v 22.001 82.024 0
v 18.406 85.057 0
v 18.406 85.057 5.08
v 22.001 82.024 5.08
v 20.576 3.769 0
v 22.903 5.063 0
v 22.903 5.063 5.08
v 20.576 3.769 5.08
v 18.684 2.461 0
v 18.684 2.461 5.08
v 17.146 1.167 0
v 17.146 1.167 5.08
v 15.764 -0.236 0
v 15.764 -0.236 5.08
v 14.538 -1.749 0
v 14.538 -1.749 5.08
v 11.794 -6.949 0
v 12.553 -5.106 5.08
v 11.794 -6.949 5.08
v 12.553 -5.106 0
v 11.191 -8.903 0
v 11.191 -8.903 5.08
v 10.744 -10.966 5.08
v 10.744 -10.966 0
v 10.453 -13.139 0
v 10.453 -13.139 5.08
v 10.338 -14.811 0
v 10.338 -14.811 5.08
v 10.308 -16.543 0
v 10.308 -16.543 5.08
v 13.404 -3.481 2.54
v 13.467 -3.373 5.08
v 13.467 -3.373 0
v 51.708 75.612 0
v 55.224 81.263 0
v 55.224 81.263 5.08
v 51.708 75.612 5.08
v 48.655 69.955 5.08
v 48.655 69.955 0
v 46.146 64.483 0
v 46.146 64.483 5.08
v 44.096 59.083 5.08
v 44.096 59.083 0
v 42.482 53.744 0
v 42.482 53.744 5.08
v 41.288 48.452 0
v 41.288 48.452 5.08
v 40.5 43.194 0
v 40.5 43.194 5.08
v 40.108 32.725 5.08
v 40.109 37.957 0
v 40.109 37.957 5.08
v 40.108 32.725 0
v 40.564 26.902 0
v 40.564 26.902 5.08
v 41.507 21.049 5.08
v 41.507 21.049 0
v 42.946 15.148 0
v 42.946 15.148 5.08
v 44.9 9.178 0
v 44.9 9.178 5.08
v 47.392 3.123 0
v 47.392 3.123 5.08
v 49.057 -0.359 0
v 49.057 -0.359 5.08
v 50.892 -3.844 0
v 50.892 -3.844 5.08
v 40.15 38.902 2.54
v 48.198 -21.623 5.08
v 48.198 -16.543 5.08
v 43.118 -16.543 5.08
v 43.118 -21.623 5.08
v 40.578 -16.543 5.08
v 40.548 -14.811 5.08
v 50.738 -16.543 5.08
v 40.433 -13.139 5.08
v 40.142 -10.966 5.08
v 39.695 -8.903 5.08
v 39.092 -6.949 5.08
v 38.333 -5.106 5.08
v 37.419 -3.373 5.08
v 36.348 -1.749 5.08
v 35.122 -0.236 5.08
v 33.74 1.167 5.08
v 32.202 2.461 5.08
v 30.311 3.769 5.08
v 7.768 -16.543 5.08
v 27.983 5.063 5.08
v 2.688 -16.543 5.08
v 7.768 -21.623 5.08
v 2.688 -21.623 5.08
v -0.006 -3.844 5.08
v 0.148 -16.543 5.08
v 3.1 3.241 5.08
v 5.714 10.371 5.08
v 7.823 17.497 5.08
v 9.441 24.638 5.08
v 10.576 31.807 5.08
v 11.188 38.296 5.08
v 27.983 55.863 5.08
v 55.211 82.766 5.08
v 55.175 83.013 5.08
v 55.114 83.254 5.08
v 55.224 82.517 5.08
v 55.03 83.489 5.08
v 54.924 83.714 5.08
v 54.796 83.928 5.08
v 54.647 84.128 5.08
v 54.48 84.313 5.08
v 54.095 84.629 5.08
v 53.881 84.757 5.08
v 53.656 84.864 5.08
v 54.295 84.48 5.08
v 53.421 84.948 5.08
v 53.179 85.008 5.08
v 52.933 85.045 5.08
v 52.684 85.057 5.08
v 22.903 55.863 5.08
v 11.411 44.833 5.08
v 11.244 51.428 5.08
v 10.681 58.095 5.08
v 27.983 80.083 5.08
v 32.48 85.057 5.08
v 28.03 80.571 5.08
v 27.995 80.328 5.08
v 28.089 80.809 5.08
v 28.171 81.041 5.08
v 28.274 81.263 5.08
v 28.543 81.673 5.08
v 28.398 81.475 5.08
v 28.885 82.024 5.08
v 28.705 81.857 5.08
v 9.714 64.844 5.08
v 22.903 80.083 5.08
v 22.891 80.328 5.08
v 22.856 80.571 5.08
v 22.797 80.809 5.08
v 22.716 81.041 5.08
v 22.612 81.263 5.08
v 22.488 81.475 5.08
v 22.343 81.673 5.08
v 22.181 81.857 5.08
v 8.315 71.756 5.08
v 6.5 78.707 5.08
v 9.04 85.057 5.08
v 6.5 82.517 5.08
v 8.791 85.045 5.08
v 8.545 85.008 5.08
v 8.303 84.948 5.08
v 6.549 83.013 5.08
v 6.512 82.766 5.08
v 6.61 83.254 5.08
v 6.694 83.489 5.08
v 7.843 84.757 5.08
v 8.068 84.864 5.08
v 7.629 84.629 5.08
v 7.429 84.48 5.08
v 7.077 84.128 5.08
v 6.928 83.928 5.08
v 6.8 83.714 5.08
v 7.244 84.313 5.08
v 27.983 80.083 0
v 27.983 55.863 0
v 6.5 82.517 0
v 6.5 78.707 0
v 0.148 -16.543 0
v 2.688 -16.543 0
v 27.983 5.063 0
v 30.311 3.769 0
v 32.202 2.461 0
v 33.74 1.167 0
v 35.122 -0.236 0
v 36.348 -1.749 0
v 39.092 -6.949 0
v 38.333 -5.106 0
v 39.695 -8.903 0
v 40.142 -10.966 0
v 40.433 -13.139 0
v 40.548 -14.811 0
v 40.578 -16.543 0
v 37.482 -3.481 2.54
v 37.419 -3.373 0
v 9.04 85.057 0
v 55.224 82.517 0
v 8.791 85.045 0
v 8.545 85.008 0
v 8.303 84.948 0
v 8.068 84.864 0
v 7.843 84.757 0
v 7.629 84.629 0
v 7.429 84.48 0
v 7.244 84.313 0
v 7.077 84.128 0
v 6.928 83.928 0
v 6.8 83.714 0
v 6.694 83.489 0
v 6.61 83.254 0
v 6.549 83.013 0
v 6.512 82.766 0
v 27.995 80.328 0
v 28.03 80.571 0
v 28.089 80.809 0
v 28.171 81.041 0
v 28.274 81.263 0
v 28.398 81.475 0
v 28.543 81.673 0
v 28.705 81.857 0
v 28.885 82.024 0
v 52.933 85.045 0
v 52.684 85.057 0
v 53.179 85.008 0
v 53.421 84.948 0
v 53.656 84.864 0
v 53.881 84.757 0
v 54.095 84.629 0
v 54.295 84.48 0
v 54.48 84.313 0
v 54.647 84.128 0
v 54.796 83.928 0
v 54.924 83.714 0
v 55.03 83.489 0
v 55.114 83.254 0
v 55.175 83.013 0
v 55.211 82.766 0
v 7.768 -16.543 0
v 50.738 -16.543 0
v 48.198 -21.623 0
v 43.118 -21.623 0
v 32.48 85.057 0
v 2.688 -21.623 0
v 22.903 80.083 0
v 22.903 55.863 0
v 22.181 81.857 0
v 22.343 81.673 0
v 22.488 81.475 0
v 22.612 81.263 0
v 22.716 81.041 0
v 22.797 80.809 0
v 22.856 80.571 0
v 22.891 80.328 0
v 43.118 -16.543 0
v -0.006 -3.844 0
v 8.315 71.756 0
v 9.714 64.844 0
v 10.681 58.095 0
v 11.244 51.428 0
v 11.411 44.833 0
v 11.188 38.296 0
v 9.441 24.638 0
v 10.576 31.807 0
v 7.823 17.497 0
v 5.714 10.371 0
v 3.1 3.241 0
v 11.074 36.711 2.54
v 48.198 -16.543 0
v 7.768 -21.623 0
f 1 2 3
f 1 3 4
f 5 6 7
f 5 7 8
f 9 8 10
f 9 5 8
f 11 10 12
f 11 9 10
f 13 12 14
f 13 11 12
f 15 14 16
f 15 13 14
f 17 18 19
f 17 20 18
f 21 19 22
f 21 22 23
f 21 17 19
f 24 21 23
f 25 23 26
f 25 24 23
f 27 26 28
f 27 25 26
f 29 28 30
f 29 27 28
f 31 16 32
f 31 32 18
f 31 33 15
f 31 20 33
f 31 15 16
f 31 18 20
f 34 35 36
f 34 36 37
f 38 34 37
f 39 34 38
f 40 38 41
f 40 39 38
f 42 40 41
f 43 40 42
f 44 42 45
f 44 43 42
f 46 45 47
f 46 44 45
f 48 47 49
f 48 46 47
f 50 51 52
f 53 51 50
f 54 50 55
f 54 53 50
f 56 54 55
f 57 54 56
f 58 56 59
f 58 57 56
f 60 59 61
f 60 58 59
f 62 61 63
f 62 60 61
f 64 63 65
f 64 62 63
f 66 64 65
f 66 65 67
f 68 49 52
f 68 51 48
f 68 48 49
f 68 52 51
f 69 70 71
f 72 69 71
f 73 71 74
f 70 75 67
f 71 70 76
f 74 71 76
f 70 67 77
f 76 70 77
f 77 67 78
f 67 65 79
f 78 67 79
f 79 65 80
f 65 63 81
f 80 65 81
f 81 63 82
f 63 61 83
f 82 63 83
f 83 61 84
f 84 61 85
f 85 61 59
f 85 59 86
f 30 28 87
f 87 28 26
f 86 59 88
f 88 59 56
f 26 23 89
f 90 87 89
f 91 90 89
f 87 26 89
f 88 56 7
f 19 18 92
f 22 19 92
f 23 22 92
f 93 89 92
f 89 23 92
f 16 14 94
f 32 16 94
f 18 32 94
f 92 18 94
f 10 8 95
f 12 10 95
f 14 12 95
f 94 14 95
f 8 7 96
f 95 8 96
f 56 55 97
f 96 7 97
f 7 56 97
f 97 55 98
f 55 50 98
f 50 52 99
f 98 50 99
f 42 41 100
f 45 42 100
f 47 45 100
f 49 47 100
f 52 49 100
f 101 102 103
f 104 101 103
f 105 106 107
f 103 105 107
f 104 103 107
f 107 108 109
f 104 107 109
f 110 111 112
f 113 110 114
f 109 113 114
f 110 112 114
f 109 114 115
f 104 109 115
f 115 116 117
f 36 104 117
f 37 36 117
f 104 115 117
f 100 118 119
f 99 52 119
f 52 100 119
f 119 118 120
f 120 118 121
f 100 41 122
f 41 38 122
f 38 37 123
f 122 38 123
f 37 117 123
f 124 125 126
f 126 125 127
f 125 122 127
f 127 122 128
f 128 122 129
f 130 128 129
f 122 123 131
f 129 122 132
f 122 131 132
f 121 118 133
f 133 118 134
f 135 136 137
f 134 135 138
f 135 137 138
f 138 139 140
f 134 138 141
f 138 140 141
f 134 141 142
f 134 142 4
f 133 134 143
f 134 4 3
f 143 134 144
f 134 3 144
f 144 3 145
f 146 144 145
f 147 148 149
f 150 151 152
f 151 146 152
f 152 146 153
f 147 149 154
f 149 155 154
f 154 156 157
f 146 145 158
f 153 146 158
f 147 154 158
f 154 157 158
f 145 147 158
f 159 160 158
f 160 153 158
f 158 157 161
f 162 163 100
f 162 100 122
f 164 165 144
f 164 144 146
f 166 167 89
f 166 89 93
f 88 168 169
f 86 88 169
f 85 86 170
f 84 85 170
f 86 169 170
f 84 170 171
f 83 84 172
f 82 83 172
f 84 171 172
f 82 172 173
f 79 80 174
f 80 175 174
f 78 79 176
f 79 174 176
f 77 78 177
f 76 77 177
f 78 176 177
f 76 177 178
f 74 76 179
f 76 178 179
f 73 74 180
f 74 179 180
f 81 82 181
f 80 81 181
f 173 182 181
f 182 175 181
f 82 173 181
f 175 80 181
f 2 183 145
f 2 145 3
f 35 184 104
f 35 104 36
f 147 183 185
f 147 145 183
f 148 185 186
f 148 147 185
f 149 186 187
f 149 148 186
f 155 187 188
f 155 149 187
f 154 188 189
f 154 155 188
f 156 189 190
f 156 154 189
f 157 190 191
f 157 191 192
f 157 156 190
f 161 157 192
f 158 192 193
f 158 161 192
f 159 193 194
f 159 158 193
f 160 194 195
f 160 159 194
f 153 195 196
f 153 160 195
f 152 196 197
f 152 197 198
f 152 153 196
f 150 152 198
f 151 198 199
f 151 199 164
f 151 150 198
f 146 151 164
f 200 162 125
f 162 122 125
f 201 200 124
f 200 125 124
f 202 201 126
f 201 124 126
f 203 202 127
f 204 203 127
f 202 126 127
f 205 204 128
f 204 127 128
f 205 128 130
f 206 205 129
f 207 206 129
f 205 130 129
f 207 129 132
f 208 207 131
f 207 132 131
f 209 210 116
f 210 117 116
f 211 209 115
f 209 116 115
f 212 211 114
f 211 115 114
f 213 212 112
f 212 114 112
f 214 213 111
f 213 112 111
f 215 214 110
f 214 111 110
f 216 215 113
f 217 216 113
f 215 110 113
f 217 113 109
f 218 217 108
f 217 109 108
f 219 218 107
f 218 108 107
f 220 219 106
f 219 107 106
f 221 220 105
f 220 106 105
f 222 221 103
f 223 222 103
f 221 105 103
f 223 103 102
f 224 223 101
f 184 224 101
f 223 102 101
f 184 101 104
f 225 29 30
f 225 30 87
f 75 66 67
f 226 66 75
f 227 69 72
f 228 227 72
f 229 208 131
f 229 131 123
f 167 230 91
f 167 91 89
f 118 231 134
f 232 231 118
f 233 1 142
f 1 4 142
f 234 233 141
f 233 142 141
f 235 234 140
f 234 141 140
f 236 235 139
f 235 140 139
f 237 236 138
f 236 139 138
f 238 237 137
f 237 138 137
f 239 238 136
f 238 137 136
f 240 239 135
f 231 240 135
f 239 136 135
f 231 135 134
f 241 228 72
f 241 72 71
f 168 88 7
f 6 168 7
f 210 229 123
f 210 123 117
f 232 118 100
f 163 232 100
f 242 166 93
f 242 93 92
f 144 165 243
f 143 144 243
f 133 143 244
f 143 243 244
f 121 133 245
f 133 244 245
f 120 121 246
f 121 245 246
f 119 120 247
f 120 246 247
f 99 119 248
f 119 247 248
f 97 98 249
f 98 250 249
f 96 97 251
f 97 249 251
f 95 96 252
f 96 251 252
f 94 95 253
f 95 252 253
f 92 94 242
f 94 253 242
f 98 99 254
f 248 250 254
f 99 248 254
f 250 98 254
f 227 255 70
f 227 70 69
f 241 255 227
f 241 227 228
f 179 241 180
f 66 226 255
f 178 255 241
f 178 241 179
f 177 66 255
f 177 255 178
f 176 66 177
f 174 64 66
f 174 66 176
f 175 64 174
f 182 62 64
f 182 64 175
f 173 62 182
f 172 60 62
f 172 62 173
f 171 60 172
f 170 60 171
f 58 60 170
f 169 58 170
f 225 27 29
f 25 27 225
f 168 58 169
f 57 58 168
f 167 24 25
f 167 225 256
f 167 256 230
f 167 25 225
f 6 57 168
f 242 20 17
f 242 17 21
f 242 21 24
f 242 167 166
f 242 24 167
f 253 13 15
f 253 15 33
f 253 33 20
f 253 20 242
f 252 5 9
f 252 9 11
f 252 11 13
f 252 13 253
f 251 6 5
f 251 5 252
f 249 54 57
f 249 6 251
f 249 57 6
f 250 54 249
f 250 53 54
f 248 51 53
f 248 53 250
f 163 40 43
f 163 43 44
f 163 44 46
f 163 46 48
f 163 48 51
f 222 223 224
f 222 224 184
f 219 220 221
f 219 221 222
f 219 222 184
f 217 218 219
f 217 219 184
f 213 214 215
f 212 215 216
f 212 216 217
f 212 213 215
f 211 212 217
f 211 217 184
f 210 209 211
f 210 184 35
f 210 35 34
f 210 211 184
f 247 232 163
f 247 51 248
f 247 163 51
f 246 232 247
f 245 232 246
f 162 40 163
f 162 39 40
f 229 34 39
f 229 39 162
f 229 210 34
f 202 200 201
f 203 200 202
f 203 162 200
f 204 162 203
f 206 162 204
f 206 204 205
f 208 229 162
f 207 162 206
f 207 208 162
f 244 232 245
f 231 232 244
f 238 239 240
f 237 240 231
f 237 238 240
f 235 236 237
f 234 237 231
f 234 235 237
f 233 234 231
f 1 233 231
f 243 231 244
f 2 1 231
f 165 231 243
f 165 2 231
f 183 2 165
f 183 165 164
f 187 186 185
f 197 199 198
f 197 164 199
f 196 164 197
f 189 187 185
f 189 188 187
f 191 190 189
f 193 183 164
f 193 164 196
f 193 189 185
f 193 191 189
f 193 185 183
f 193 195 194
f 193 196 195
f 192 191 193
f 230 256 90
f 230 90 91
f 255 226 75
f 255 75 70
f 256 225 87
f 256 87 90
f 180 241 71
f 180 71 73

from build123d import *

# Parameters (mm, degrees)
BOSS_EXTRUDE6_DEPTH = 5.08
FILLET21_R          = 2.54
FILLET22_R          = 2.54
FILLET23_R          = 2.54
FILLET24_R          = 2.54


with BuildPart() as part:
    # Sketch1 → Boss-Extrude6 (new body)
    with BuildSketch(Plane.XY):
        with BuildLine():
            Line((0.14834484, -16.543006694), (-0.005888561, -3.843943262))
            add(Edge.make_bspline(
                [(6.500180425, 78.706993306), (18.901808207, 35.989935529), (-0.005888561, -3.843943262)],
                knots=[0, 0, 0, 1, 1, 1], degree=2))
            Line((6.500180425, 78.706993306), (6.500180425, 85.056993306))
            Line((6.500180425, 85.056993306), (18.406430425, 85.056993306))
            Line((18.406430425, 85.056993306), (22.903074533, 81.262968128))
            Line((22.903074533, 81.262968128), (22.903074533, 55.862968128))
            Line((22.903074533, 55.862968128), (27.983074533, 55.862968128))
            Line((27.983074533, 55.862968128), (27.983074533, 81.262968128))
            Line((27.983074533, 81.262968128), (32.479718641, 85.056993306))
            Line((32.479718641, 85.056993306), (55.223636327, 85.056993306))
            Line((55.223636327, 85.056993306), (55.223636327, 81.262968128))
            add(Edge.make_bspline(
                [(55.223636327, 81.262968128), (27.243001732, 39.093980891), (50.892037627, -3.843943262)],
                knots=[0, 0, 0, 1, 1, 1], degree=2))
            Line((50.892037627, -3.843943262), (50.737804225, -16.543006694))
            Line((50.737804225, -16.543006694), (48.197804225, -16.543006694))
            Line((48.197804225, -16.543006694), (48.197804225, -21.623006694))
            Line((48.197804225, -21.623006694), (43.117804225, -21.623006694))
            Line((43.117804225, -21.623006694), (43.117804225, -16.543006694))
            Line((43.117804225, -16.543006694), (40.577804225, -16.543006694))
            add(Edge.make_bspline(
                [(27.983074533, 5.062968128), (40.683819064, -1.22119794), (40.577804225, -16.543006694)],
                knots=[0, 0, 0, 1, 1, 1], degree=2))
            Line((27.983074533, 5.062968128), (22.903074533, 5.062968128))
            add(Edge.make_bspline(
                [(22.903074533, 5.062968128), (10.202330001, -1.22119794), (10.30834484, -16.543006694)],
                knots=[0, 0, 0, 1, 1, 1], degree=2))
            Line((10.30834484, -16.543006694), (7.76834484, -16.543006694))
            Line((7.76834484, -16.543006694), (7.76834484, -21.623006694))
            Line((7.76834484, -21.623006694), (2.68834484, -21.623006694))
            Line((2.68834484, -21.623006694), (2.68834484, -16.543006694))
            Line((2.68834484, -16.543006694), (0.14834484, -16.543006694))
        make_face()
    extrude(amount=BOSS_EXTRUDE6_DEPTH)

    # Fillet21
    fillet21_edges = [part.edges().sort_by_distance(p)[0] for p in [
        (22.903074533, 81.262968128, 2.54),
    ]]
    fillet(fillet21_edges, radius=FILLET21_R)

    # Fillet22
    fillet22_edges = [part.edges().sort_by_distance(p)[0] for p in [
        (27.983074533, 81.262968128, 2.54),
    ]]
    fillet(fillet22_edges, radius=FILLET22_R)

    # Fillet23
    fillet23_edges = [part.edges().sort_by_distance(p)[0] for p in [
        (6.500180425, 85.056993306, 2.54),
    ]]
    fillet(fillet23_edges, radius=FILLET23_R)

    # Fillet24
    fillet24_edges = [part.edges().sort_by_distance(p)[0] for p in [
        (55.223636327, 85.056993306, 2.54),
    ]]
    fillet(fillet24_edges, radius=FILLET24_R)


solid = part.part
